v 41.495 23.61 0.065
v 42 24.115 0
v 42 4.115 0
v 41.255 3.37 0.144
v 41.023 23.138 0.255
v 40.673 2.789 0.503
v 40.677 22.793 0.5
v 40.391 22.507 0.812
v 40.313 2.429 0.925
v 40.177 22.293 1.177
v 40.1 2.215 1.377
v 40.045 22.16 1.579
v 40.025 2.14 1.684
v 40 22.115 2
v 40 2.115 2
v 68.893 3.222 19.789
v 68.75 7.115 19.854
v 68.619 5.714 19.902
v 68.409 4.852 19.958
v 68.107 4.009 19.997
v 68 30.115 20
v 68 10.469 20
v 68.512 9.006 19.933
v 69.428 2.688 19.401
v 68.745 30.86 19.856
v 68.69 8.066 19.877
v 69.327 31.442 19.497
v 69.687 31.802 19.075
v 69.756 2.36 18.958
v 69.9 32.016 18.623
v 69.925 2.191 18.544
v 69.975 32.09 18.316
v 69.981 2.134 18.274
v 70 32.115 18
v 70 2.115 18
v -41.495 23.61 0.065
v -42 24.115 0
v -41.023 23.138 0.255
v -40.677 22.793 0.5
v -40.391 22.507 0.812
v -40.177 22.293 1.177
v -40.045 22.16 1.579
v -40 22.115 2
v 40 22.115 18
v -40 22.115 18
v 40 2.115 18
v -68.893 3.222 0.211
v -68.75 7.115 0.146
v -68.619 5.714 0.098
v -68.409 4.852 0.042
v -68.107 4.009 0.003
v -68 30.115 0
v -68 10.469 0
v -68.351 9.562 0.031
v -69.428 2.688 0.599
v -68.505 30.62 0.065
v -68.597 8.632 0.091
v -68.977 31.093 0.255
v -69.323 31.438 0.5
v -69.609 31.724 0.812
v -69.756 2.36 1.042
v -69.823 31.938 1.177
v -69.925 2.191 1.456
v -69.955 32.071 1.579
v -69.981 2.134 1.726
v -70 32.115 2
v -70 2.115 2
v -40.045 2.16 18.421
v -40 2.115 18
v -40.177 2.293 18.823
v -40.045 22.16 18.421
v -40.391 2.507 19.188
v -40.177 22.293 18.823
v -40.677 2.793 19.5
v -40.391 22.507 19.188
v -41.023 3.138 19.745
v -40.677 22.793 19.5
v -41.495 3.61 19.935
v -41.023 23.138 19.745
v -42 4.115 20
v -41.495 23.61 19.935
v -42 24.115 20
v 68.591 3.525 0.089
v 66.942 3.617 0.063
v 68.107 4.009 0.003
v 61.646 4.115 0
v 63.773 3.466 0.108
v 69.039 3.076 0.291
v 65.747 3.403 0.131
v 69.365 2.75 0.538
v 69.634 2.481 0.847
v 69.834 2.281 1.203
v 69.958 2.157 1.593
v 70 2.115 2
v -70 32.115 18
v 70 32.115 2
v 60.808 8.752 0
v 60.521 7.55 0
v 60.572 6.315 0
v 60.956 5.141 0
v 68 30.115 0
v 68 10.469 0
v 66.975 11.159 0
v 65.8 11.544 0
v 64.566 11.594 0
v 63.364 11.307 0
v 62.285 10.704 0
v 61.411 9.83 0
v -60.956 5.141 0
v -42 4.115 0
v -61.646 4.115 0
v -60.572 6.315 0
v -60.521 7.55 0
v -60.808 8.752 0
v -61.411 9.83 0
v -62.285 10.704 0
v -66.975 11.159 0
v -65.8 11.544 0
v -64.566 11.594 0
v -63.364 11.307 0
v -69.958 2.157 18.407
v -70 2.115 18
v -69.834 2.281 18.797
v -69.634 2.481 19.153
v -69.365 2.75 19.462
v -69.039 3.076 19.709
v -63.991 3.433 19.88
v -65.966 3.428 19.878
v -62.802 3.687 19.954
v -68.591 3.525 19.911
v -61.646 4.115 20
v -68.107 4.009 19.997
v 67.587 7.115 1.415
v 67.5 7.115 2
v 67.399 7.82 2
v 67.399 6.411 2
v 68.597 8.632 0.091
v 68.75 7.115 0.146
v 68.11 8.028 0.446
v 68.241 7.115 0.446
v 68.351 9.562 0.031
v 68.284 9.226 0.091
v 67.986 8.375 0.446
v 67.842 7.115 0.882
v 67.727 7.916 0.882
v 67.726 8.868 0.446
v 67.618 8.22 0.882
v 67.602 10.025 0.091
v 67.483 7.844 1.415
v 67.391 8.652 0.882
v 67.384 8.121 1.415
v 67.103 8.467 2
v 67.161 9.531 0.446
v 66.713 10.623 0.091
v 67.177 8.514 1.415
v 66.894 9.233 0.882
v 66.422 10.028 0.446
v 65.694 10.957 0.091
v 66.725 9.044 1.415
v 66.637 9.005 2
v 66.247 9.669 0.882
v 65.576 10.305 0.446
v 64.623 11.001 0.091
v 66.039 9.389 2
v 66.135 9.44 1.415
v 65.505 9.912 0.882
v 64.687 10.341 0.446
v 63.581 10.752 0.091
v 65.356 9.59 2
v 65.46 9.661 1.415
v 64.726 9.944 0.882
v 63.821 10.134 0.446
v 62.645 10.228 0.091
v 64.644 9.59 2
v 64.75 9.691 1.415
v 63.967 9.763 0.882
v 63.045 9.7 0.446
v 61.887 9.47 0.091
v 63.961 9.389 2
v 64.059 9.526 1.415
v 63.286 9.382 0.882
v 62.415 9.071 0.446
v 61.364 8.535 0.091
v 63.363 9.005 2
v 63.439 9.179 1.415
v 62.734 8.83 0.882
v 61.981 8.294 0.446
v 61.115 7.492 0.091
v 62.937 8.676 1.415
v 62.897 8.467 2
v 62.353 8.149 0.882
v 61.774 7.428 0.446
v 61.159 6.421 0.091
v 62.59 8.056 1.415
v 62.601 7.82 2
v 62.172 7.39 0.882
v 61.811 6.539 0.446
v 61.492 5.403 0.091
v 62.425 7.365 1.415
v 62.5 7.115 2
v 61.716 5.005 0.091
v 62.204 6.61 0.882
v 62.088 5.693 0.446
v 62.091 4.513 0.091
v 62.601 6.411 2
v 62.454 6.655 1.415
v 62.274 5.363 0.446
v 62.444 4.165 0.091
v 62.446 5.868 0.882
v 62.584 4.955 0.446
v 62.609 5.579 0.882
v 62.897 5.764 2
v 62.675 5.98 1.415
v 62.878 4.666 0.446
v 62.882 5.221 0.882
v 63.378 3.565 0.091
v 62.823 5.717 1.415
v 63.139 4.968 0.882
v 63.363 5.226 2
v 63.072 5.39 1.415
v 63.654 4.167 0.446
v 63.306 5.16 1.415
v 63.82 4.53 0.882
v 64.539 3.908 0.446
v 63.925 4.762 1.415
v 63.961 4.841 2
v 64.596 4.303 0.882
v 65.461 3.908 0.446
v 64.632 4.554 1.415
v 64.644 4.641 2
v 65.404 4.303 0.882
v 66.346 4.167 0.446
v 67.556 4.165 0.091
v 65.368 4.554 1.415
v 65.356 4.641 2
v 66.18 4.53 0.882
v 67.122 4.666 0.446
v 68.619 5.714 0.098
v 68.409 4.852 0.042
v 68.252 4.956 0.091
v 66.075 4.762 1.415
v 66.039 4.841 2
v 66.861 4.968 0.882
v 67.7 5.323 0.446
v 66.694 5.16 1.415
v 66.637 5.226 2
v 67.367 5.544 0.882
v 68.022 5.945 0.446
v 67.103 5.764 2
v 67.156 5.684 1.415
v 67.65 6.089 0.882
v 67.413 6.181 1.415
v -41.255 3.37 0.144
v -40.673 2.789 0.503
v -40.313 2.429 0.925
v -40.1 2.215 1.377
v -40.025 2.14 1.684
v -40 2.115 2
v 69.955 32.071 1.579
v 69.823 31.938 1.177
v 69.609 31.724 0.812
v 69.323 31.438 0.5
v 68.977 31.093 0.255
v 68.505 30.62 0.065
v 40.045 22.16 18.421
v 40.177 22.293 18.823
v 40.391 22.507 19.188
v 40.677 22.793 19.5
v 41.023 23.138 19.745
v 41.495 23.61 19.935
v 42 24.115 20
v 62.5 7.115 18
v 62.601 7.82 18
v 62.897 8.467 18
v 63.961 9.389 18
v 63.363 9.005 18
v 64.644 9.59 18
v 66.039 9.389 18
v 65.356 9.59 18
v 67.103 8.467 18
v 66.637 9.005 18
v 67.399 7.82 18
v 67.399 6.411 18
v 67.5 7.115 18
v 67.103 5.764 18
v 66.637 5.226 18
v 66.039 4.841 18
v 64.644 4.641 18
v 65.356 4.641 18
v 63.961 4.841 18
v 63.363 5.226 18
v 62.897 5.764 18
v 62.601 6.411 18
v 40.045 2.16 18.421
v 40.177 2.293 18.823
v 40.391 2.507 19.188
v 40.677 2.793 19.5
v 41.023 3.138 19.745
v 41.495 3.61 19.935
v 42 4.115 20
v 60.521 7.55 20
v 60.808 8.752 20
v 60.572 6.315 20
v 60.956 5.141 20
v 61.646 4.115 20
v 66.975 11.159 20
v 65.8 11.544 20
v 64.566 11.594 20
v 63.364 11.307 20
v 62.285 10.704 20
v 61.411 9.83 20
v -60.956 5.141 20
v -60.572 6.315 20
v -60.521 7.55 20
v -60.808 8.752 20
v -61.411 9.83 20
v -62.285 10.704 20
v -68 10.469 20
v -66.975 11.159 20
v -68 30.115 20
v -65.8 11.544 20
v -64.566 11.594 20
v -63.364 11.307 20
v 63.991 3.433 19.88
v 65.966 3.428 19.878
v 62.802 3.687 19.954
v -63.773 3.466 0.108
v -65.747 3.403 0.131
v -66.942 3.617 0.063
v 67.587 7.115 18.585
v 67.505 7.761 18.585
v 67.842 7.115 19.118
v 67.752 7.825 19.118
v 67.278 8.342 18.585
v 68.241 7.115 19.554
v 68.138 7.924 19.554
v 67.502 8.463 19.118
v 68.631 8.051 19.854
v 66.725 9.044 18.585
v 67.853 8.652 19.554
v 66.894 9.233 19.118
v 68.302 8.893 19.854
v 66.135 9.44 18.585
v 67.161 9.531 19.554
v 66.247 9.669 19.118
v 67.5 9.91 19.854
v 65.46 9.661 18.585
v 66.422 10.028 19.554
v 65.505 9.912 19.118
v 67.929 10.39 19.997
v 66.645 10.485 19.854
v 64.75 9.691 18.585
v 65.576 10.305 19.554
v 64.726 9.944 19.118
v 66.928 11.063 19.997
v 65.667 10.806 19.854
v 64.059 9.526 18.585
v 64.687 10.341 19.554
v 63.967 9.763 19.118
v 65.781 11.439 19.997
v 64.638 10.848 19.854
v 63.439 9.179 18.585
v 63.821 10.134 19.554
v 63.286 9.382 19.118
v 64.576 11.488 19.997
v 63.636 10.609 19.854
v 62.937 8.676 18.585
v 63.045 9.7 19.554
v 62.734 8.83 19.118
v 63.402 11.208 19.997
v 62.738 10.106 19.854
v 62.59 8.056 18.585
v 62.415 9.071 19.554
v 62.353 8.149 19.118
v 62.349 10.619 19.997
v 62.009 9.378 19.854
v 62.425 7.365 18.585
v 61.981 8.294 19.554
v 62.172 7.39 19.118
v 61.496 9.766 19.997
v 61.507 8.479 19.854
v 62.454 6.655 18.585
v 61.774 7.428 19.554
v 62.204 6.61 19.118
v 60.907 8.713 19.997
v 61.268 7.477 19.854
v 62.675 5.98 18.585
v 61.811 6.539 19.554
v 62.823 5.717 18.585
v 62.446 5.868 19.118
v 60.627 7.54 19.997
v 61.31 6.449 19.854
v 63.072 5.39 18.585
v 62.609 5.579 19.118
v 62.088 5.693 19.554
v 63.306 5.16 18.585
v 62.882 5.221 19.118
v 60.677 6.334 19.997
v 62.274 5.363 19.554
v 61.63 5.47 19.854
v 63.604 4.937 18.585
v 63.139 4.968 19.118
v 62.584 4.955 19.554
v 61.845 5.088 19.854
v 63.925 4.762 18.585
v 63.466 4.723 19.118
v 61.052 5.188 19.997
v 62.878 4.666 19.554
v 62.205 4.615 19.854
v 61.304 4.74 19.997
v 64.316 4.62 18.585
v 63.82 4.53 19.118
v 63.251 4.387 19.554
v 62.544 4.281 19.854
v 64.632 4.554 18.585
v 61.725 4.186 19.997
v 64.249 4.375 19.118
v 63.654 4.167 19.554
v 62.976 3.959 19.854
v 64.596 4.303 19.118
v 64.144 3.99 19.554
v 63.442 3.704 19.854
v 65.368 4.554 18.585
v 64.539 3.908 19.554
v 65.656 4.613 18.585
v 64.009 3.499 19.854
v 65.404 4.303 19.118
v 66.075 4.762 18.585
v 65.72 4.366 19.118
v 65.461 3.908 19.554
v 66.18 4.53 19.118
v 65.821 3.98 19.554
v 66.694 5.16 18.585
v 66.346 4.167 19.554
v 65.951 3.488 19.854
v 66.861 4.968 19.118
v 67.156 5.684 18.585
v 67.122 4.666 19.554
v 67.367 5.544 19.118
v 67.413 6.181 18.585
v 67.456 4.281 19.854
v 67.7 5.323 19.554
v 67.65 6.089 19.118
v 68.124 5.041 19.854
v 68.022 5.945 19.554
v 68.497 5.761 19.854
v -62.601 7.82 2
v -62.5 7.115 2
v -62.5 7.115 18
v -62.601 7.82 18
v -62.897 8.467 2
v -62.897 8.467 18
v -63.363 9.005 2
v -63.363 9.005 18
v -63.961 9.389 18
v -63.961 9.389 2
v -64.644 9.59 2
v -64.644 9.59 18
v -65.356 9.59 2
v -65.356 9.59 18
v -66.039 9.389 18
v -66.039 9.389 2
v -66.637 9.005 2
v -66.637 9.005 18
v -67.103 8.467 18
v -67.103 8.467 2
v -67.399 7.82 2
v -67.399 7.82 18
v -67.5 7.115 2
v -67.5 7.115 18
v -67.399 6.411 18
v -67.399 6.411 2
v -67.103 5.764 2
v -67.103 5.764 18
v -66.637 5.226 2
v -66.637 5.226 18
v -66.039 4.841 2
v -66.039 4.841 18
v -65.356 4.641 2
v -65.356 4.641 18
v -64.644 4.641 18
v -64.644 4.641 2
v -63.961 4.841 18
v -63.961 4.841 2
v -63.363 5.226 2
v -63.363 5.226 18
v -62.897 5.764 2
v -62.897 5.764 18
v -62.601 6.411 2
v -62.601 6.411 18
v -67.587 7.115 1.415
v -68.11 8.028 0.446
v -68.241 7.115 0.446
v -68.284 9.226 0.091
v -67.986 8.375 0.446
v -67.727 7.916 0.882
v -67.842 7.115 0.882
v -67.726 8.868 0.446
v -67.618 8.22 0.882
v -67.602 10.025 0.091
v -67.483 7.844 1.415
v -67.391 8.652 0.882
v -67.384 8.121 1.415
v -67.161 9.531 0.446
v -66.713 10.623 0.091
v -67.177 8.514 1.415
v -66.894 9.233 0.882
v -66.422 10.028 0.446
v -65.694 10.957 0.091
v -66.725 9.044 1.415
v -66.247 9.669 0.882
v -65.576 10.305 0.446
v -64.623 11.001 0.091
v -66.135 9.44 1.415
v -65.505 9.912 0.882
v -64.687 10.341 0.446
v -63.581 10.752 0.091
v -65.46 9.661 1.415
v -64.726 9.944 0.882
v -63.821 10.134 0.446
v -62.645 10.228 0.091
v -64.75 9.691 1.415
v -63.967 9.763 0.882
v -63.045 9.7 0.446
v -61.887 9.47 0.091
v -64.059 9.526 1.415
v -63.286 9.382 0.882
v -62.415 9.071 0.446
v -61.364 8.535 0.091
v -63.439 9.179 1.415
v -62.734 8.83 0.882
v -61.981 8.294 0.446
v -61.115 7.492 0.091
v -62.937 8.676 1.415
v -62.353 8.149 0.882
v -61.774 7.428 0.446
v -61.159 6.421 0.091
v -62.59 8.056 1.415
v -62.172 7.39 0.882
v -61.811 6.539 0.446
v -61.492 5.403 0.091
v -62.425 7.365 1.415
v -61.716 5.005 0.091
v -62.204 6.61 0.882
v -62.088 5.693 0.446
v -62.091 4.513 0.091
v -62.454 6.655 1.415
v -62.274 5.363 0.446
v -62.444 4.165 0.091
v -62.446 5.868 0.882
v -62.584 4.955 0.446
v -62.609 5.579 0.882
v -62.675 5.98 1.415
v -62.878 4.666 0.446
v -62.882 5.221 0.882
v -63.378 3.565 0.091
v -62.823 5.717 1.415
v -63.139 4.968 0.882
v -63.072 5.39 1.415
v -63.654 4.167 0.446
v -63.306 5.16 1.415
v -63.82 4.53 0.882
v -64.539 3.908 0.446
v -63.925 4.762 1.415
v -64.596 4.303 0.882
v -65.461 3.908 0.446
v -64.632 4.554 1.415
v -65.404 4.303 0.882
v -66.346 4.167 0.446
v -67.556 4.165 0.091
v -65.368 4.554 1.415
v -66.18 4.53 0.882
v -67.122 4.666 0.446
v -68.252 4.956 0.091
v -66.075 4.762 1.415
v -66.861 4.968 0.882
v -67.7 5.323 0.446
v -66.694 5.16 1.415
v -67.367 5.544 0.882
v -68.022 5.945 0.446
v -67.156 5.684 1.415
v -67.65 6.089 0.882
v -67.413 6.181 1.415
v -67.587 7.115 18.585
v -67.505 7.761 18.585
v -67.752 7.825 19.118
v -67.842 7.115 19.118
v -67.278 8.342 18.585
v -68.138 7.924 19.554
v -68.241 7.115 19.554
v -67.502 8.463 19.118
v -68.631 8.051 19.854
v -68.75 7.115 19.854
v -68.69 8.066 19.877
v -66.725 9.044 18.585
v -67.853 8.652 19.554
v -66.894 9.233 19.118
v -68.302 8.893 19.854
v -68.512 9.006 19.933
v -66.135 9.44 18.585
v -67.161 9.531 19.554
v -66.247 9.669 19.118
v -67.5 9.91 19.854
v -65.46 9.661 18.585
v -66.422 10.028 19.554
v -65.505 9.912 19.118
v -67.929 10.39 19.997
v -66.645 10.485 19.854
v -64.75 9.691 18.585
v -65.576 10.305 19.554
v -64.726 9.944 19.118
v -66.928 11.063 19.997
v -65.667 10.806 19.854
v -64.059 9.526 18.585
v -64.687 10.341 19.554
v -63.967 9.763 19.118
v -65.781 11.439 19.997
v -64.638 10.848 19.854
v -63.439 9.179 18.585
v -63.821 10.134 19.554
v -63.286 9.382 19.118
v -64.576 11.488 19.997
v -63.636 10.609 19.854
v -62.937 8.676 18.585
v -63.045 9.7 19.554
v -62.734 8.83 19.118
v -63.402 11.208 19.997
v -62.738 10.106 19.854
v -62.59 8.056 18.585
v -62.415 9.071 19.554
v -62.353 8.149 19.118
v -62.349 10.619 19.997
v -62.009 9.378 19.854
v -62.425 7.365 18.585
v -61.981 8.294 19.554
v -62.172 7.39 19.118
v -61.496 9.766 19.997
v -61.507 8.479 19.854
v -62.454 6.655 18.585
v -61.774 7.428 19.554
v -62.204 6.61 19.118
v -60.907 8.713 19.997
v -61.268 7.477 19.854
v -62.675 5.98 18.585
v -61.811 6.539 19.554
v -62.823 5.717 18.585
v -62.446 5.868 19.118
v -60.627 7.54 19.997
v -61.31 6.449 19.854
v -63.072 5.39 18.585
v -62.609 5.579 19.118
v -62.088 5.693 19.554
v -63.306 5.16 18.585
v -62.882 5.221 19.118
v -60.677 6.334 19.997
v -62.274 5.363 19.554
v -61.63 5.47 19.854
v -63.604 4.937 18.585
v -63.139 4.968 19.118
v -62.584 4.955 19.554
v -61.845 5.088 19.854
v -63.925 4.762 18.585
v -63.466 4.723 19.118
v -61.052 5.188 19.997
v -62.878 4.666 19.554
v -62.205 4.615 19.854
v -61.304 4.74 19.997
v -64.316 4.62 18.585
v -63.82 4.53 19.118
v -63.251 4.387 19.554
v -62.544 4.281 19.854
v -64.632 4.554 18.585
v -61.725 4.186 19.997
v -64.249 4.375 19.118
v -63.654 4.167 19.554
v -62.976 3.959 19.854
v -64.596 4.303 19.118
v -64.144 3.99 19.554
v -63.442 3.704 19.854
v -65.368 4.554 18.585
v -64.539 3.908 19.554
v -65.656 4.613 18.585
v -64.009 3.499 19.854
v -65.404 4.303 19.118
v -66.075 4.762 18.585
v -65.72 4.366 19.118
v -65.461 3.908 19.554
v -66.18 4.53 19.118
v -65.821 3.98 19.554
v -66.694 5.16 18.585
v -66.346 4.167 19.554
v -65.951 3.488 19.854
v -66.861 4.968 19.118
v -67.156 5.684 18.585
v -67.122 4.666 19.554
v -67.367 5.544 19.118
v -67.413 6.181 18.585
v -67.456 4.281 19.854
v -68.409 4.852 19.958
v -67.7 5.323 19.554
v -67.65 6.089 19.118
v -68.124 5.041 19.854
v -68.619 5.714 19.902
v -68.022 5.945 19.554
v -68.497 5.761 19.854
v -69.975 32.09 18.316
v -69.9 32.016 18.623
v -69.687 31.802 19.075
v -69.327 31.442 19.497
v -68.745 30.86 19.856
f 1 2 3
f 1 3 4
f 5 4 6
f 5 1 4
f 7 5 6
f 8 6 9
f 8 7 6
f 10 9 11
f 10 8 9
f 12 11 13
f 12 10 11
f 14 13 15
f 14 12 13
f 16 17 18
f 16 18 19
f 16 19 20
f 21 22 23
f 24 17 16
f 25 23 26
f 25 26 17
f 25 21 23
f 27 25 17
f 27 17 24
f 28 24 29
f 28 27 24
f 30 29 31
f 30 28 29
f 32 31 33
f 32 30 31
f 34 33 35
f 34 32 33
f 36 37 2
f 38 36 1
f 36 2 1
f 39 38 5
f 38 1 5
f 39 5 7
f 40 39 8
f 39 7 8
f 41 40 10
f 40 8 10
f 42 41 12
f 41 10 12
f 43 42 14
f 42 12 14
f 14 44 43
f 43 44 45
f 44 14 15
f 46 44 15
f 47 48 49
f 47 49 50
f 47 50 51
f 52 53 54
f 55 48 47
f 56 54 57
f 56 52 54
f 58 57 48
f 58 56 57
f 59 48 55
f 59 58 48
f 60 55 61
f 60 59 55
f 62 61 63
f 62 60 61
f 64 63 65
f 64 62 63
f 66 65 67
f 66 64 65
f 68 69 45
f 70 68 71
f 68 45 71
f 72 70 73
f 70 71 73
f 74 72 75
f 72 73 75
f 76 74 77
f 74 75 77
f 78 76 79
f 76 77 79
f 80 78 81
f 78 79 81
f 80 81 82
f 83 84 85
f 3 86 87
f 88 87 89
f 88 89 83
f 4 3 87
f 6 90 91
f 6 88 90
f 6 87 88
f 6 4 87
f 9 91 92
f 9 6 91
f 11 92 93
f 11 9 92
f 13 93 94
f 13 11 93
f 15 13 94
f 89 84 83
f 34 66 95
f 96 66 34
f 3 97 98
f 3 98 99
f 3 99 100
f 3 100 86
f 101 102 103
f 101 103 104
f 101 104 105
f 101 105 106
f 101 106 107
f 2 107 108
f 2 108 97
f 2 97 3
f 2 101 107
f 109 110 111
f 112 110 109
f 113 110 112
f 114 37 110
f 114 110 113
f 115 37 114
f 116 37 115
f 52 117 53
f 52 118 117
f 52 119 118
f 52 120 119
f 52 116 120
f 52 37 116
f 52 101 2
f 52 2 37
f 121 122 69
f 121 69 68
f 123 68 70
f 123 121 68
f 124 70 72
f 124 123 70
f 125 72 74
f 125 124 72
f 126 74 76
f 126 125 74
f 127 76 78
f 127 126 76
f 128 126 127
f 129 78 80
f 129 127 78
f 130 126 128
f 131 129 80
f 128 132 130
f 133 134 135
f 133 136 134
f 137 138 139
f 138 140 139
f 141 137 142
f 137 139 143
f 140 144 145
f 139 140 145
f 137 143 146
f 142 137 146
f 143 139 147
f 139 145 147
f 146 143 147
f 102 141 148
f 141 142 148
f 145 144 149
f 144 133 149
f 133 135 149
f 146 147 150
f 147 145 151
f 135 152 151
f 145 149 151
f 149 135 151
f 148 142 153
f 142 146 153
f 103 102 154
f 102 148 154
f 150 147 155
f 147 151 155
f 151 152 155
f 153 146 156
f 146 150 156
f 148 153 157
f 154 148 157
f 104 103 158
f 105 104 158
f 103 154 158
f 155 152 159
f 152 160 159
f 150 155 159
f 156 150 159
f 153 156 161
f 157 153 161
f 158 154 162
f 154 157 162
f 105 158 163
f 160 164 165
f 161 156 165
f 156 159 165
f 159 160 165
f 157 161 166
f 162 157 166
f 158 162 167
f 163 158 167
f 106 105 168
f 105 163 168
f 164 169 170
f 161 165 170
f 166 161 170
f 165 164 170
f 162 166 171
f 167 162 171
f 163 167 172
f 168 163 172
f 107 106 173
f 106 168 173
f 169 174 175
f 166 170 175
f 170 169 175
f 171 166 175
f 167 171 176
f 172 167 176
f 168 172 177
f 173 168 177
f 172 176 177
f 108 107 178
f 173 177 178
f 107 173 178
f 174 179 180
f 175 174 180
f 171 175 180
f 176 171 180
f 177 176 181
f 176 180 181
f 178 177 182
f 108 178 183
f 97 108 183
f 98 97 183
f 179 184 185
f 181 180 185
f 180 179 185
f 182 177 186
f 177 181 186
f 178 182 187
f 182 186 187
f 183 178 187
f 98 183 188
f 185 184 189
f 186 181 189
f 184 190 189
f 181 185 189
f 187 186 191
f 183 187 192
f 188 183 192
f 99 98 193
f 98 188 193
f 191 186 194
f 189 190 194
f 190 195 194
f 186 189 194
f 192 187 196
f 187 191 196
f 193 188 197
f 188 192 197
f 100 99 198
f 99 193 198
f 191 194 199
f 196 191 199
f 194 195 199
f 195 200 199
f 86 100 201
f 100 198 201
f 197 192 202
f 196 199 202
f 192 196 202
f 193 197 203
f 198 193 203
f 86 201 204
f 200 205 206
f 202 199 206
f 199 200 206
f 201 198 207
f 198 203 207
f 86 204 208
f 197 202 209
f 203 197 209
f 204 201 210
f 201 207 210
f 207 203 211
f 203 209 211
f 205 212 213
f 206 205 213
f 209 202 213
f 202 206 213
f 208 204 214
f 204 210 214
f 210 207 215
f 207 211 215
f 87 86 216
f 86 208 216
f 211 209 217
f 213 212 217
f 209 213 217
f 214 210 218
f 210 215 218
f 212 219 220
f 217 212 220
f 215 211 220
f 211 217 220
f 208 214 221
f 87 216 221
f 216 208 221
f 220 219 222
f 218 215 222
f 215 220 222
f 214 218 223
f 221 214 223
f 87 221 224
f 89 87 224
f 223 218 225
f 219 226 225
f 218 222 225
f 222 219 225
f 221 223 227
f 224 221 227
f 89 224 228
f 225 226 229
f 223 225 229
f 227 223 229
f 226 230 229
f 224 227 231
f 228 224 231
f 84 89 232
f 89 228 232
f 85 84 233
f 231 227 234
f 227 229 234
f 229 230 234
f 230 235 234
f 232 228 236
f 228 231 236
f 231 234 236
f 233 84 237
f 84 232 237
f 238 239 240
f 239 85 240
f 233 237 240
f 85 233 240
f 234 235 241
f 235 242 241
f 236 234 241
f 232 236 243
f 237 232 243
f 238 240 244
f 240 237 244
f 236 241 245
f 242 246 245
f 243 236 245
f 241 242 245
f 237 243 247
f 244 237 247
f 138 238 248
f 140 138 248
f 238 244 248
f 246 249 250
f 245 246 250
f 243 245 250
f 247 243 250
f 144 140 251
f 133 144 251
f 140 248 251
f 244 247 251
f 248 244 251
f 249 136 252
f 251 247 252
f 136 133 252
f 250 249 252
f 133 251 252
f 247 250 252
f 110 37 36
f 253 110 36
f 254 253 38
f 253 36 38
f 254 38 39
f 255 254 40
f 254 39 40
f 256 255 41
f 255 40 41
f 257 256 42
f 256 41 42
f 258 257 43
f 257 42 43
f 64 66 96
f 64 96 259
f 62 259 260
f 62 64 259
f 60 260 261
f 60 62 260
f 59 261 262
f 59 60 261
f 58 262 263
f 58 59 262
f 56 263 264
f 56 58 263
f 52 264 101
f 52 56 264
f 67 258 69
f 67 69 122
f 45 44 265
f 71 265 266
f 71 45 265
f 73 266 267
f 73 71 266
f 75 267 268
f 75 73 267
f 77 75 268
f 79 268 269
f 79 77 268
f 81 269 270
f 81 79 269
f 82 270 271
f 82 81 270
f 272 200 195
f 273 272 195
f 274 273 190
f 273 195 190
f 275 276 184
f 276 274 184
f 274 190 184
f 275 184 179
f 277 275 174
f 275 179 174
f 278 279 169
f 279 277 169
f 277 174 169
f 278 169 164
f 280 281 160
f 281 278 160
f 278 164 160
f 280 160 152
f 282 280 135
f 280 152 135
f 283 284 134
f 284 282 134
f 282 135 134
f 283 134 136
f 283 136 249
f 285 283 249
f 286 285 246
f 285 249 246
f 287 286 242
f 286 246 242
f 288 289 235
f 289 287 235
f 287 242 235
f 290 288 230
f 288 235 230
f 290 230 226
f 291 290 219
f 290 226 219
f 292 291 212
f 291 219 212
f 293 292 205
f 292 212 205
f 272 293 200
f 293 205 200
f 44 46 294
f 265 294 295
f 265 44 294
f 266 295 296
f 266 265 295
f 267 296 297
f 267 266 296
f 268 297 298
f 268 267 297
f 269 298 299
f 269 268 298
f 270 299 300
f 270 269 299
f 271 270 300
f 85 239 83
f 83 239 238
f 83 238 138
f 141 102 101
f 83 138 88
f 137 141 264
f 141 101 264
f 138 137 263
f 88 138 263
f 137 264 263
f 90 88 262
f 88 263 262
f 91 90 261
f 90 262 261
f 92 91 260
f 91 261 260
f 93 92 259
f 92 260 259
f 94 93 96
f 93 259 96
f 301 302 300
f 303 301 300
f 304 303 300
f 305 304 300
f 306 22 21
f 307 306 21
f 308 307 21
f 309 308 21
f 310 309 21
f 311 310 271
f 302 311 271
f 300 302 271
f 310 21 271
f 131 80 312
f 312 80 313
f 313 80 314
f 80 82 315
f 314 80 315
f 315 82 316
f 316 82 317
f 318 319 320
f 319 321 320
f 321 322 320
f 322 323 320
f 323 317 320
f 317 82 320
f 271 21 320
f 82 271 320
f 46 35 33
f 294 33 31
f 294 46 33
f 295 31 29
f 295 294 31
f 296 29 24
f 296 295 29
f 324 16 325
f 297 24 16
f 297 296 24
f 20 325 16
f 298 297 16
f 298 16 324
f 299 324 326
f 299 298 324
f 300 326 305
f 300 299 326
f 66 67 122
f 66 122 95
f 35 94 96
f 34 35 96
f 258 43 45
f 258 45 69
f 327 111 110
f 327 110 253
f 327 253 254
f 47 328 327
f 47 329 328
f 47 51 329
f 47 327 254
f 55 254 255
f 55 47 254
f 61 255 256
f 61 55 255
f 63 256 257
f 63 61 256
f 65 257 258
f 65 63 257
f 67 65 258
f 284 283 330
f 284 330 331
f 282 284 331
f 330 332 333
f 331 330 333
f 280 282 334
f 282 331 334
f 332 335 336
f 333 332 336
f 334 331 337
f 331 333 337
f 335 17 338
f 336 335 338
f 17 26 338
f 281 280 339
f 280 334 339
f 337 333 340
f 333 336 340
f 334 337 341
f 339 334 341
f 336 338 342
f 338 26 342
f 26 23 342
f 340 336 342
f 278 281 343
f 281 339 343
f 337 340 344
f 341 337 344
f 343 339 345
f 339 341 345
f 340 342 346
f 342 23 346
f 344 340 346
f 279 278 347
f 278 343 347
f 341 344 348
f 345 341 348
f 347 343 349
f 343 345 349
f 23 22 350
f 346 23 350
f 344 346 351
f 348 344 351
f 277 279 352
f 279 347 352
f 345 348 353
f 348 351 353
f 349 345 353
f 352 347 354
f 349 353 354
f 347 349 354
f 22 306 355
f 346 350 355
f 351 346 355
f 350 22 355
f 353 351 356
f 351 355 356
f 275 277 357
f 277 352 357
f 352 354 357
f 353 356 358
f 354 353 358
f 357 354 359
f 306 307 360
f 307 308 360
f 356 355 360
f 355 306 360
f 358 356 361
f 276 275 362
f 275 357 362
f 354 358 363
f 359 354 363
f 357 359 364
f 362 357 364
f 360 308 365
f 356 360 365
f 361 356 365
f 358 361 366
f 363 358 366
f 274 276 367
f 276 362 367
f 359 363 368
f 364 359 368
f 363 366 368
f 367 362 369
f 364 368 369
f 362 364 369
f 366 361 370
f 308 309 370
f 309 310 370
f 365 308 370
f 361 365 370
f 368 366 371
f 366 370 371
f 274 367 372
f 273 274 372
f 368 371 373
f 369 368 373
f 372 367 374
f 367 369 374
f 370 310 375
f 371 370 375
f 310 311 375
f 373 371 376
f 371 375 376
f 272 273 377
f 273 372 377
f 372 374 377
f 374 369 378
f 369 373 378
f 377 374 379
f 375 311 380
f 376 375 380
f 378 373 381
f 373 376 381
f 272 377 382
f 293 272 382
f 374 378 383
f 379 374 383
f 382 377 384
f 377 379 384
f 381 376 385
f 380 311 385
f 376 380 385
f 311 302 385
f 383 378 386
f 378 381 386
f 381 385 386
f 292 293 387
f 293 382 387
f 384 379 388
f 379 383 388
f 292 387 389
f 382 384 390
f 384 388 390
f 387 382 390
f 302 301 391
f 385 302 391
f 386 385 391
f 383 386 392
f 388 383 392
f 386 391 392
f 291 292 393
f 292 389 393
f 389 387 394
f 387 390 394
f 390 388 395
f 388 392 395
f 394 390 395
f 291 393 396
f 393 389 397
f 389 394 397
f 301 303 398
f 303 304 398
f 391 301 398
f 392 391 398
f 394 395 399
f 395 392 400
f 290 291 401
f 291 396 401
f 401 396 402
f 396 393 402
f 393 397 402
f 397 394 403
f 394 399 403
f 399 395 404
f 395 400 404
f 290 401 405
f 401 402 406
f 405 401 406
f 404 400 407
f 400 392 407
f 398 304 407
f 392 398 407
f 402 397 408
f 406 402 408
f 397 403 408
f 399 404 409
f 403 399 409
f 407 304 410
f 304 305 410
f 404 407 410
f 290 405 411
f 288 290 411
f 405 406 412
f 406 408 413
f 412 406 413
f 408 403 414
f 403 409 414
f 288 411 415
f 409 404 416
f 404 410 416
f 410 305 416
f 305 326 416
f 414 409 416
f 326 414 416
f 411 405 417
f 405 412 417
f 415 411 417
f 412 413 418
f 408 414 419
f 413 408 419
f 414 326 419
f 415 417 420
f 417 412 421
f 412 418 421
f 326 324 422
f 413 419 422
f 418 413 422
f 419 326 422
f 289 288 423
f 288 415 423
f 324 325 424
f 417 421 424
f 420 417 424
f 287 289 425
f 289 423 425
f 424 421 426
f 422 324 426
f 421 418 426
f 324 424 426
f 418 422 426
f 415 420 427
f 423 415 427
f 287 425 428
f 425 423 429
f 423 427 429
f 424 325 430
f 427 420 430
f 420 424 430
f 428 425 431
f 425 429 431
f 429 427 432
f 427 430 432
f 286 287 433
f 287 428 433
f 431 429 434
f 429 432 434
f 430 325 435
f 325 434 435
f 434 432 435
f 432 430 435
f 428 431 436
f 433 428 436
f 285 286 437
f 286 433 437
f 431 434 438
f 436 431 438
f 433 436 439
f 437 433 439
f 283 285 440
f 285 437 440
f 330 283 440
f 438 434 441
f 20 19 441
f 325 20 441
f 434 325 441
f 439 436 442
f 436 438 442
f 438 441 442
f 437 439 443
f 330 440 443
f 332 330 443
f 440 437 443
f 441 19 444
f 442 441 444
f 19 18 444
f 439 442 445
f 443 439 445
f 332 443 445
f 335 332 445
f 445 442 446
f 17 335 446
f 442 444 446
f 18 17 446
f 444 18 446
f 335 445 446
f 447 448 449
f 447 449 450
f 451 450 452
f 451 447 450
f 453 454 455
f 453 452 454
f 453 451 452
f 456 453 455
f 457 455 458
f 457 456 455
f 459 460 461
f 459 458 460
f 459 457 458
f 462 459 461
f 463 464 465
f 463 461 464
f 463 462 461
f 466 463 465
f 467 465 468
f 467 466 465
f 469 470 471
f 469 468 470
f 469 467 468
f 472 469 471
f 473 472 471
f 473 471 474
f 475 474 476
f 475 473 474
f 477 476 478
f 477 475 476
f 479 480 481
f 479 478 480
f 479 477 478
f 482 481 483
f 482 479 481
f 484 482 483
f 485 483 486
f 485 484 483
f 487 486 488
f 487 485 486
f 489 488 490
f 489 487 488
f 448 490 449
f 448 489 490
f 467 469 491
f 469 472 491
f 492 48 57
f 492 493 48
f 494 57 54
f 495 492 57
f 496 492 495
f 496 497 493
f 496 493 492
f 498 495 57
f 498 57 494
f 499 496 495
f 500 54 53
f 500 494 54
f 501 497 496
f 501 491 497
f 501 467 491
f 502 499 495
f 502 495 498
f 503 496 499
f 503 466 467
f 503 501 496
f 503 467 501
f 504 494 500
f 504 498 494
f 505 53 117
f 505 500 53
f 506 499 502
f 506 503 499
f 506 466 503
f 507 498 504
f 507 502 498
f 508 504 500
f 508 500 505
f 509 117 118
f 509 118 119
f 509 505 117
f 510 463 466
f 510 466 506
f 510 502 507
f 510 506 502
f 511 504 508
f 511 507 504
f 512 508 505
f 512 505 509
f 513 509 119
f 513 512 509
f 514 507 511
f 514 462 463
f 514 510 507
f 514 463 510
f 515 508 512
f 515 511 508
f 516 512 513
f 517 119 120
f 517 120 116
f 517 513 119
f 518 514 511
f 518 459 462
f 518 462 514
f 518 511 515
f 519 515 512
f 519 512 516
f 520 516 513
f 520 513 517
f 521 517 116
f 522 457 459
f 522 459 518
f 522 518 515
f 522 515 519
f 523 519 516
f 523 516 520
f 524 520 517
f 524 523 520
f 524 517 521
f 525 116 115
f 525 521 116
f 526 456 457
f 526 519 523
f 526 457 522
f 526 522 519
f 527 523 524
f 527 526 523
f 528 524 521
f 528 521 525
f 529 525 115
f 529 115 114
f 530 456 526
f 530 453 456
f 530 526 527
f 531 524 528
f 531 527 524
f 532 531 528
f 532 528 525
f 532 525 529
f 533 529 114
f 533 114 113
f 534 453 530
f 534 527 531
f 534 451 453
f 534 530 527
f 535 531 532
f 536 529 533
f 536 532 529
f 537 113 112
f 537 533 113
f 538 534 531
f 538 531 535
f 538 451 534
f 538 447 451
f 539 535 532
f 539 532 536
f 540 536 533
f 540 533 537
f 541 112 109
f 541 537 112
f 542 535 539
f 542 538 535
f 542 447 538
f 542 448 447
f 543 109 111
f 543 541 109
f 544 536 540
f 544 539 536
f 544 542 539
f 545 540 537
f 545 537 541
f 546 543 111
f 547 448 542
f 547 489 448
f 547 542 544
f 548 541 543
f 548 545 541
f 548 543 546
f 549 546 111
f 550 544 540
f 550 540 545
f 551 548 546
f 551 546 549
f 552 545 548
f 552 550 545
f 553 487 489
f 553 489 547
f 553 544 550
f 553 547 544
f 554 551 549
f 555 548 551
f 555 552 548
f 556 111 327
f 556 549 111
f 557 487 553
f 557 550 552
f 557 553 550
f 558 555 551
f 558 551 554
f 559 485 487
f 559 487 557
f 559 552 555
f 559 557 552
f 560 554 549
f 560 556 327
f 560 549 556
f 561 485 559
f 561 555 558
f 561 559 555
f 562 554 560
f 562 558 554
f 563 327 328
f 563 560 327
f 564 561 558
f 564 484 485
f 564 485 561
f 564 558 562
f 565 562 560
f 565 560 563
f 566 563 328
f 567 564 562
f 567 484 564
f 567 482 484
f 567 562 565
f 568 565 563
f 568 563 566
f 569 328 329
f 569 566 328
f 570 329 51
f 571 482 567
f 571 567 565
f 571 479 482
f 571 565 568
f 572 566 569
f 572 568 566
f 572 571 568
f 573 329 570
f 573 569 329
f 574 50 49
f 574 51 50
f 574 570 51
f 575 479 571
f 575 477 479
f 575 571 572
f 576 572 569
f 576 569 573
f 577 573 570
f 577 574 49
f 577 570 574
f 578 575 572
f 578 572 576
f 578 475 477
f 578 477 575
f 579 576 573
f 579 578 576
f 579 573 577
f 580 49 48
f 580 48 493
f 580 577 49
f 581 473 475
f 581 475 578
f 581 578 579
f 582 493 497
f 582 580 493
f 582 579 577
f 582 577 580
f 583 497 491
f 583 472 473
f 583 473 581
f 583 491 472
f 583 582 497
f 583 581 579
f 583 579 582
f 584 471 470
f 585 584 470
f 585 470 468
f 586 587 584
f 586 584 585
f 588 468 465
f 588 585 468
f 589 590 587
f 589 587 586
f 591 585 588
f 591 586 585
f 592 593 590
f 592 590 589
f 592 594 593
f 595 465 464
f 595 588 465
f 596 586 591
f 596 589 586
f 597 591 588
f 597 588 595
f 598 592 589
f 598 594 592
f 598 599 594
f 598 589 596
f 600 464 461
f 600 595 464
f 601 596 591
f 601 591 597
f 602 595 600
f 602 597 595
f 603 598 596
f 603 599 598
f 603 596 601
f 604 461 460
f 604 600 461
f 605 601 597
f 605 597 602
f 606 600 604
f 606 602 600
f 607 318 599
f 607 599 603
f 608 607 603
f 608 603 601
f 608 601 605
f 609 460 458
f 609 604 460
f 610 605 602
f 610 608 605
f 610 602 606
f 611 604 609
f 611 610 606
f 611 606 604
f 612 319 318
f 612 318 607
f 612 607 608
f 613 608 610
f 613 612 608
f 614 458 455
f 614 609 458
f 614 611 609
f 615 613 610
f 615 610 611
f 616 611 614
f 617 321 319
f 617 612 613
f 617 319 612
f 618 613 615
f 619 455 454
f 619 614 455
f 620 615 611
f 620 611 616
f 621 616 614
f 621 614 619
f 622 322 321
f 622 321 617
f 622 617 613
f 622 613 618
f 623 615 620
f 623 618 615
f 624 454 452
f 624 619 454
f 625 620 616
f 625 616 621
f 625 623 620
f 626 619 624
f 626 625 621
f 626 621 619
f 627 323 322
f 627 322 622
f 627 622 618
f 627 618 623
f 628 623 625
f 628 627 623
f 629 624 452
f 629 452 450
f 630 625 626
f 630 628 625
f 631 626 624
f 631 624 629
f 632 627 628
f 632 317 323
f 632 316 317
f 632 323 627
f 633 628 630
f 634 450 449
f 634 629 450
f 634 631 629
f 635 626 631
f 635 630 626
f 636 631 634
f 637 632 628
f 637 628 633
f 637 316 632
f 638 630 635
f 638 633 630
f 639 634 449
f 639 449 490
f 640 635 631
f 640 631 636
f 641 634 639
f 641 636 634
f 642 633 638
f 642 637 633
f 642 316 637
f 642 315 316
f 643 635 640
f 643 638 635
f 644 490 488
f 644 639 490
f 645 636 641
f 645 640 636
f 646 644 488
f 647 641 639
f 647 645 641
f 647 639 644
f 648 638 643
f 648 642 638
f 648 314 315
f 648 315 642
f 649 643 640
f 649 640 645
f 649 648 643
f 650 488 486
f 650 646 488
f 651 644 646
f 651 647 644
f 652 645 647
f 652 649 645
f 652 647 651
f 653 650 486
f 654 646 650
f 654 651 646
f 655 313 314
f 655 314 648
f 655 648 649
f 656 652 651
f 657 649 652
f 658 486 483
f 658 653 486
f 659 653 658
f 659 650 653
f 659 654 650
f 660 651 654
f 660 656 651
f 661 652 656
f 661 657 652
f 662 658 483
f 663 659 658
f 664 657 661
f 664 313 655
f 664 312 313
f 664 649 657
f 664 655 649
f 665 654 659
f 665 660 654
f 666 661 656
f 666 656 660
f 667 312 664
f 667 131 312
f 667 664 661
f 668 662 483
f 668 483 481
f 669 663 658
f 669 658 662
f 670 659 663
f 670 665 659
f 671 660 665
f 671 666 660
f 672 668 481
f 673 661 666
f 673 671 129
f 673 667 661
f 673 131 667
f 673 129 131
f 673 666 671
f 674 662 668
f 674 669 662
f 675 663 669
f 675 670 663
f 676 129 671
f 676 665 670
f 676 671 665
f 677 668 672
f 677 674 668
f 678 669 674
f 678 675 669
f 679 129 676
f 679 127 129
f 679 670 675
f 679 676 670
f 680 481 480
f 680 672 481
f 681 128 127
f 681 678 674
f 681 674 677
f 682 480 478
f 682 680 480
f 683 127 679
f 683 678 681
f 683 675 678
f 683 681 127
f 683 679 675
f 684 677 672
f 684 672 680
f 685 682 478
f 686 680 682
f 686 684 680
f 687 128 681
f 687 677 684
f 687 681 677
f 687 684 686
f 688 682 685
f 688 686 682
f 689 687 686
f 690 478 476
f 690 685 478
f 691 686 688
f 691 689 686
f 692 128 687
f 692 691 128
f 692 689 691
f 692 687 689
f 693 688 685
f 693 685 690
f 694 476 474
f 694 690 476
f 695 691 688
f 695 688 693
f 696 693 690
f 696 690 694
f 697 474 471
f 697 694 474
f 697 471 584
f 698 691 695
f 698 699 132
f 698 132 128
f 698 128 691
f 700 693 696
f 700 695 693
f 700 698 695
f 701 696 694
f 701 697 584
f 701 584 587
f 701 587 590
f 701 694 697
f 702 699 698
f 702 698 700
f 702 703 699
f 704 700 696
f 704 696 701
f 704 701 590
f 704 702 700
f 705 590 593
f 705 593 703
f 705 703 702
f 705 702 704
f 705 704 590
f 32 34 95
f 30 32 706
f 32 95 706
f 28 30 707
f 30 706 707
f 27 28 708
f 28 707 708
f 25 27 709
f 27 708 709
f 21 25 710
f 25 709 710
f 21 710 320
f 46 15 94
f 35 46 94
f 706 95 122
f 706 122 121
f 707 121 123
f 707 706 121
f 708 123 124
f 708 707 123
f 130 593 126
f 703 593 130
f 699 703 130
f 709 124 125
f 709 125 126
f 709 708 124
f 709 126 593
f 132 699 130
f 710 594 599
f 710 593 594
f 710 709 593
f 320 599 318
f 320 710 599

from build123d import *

# Parameters (mm, degrees)
F1_DEPTH     = 20
F3_D         = 5
F5_T1_DEPTH  = 150
F5_T3_DEPTH  = 40
F5_T5_DEPTH  = 40
F5_T7_DEPTH  = 25
F5_T9_DEPTH  = 80
F5_T11_DEPTH = 40
F5_T25_DEPTH = 85
F5_T29_DEPTH = 30
F5_T36_DEPTH = 30
F5_T40_DEPTH = 85
F5_T47_DEPTH = 30
F5_T51_DEPTH = 85
F5_T58_DEPTH = 85
F5_T62_DEPTH = 30


# Not quite as in the source:
# - a fillet or chamfer that OpenCascade refuses, or shapes differently, is made with other operations: its cross-section is extruded or revolved along the edge and cut away or added


with BuildPart() as f1:
    # F0 (on Top) → F1 (new body)
    with BuildSketch(Plane.XY):
        Polygon((70, 32.1153850414), (0, 32.1153850414), (0, 22.1153850414), (40, 22.1153850414), (40, 2.1153850414), (70, 2.1153850414), align=None)
    extrude(amount=F1_DEPTH)

    # F3 (through all)
    with Locations(Plane.XY.offset(20)):
        with Locations((65, 7.1153850414)):
            Hole(F3_D / 2)

    # F4: F1 across face


with BuildPart() as f1_1:
    add(f1.part)
    add(f1.part.mirror(Plane(origin=(0, 27.1153850414, 10), x_dir=(0, -1, 0), z_dir=(-1, 0, 0))))

    # F5: fillet of radius 2 on 20 edges, made by hand

    # F5_s2 → F5_t1 (cut)
    with BuildSketch(Plane.YZ.offset(-75)):
        with BuildLine():
            ThreePointArc((32.1153850414, 18), (31.5295986038, 19.4142135624), (30.1153850414, 20))
            Line((30.1153850414, 20), (32.1153850414, 20))
            Line((32.1153850414, 20), (32.1153850414, 18))
        make_face()
        with BuildLine():
            ThreePointArc((32.1153850414, 2), (31.5295986038, 0.5857864376), (30.1153850414, 0))
            Line((30.1153850414, 0), (32.1153850414, 0))
            Line((32.1153850414, 0), (32.1153850414, 2))
        make_face()
    extrude(amount=F5_T1_DEPTH, mode=Mode.SUBTRACT)

    # F5_s4 → F5_t3 (cut)
    with BuildSketch(Plane.XZ.offset(-37.1153850414)):
        with BuildLine():
            ThreePointArc((-70, 18), (-69.4142135624, 19.4142135624), (-68, 20))
            Line((-68, 20), (-70, 20))
            Line((-70, 20), (-70, 18))
        make_face()
        with BuildLine():
            ThreePointArc((68, 20), (69.4142135624, 19.4142135624), (70, 18))
            Line((70, 18), (70, 20))
            Line((70, 20), (68, 20))
        make_face()
        with BuildLine():
            ThreePointArc((-68, 0), (-69.4142135624, 0.5857864376), (-70, 2))
            Line((-70, 2), (-70, 0))
            Line((-70, 0), (-68, 0))
        make_face()
        with BuildLine():
            ThreePointArc((68, 0), (69.4142135624, 0.5857864376), (70, 2))
            Line((70, 2), (70, 0))
            Line((70, 0), (68, 0))
        make_face()
    extrude(amount=F5_T3_DEPTH, mode=Mode.SUBTRACT)

    # F5_s6 → F5_t5 (cut)
    with BuildSketch(Plane.YZ.offset(-75)):
        with BuildLine():
            ThreePointArc((2.1153850414, 18), (2.701171479, 19.4142135624), (4.1153850414, 20))
            Line((4.1153850414, 20), (2.1153850414, 20))
            Line((2.1153850414, 20), (2.1153850414, 18))
        make_face()
        with BuildLine():
            ThreePointArc((4.1153850414, 0), (2.701171479, 0.5857864376), (2.1153850414, 2))
            Line((2.1153850414, 2), (2.1153850414, 0))
            Line((2.1153850414, 0), (4.1153850414, 0))
        make_face()
    extrude(amount=F5_T5_DEPTH, mode=Mode.SUBTRACT)

    # F5_s8 → F5_t7 (cut)
    with BuildSketch(Plane.XZ.offset(-22.1153850414)):
        with BuildLine():
            ThreePointArc((-40, 18), (-40.5857864376, 19.4142135624), (-42, 20))
            Line((-42, 20), (-40, 20))
            Line((-40, 20), (-40, 18))
        make_face()
        with BuildLine():
            ThreePointArc((40, 18), (40.5857864376, 19.4142135624), (42, 20))
            Line((42, 20), (40, 20))
            Line((40, 20), (40, 18))
        make_face()
        with BuildLine():
            ThreePointArc((-42, 0), (-40.5857864376, 0.5857864376), (-40, 2))
            Line((-40, 2), (-40, 0))
            Line((-40, 0), (-42, 0))
        make_face()
        with BuildLine():
            ThreePointArc((42, 0), (40.5857864376, 0.5857864376), (40, 2))
            Line((40, 2), (40, 0))
            Line((40, 0), (42, 0))
        make_face()
    extrude(amount=F5_T7_DEPTH, mode=Mode.SUBTRACT)

    # F5_s10 → F5_t9 (cut)
    with BuildSketch(Plane.YZ.offset(-40)):
        with BuildLine():
            ThreePointArc((22.1153850414, 18), (22.701171479, 19.4142135624), (24.1153850414, 20))
            Line((24.1153850414, 20), (22.1153850414, 20))
            Line((22.1153850414, 20), (22.1153850414, 18))
        make_face()
        with BuildLine():
            ThreePointArc((24.1153850414, 0), (22.701171479, 0.5857864376), (22.1153850414, 2))
            Line((22.1153850414, 2), (22.1153850414, 0))
            Line((22.1153850414, 0), (24.1153850414, 0))
        make_face()
    extrude(amount=F5_T9_DEPTH, mode=Mode.SUBTRACT)

    # F5_s12 → F5_t11 (cut)
    with BuildSketch(Plane.YZ.offset(35)):
        with BuildLine():
            ThreePointArc((2.1153850414, 18), (2.701171479, 19.4142135624), (4.1153850414, 20))
            Line((4.1153850414, 20), (2.1153850414, 20))
            Line((2.1153850414, 20), (2.1153850414, 18))
        make_face()
        with BuildLine():
            ThreePointArc((4.1153850414, 0), (2.701171479, 0.5857864376), (2.1153850414, 2))
            Line((2.1153850414, 2), (2.1153850414, 0))
            Line((2.1153850414, 0), (4.1153850414, 0))
        make_face()
    extrude(amount=F5_T11_DEPTH, mode=Mode.SUBTRACT)

    # F5_s13 → F5_t14 (revolve, cut)
    with BuildSketch(Plane.XZ.offset(-7.1153850414)):
        with BuildLine():
            ThreePointArc((67.5, 18), (68.0857864376, 19.4142135624), (69.5, 20))
            Line((69.5, 20), (67.5, 20))
            Line((67.5, 20), (67.5, 18))
        make_face()
    revolve(axis=Axis((65, 7.1153850414, 20), (0, 0, 1)), mode=Mode.SUBTRACT)

    # F5_s15 → F5_t16 (revolve, cut)
    with BuildSketch(Plane.XZ.offset(-7.1153850414)):
        with BuildLine():
            ThreePointArc((-67.5, 18), (-68.0857864376, 19.4142135624), (-69.5, 20))
            Line((-69.5, 20), (-67.5, 20))
            Line((-67.5, 20), (-67.5, 18))
        make_face()
    revolve(axis=Axis((-65, 7.1153850414, 20), (0, 0, -1)), mode=Mode.SUBTRACT)

    # F5_s17 → F5_t18 (revolve, cut)
    with BuildSketch(Plane.XZ.offset(-7.1153850414)):
        with BuildLine():
            ThreePointArc((69.5, 0), (68.0857864376, 0.5857864376), (67.5, 2))
            Line((67.5, 2), (67.5, 0))
            Line((67.5, 0), (69.5, 0))
        make_face()
    revolve(axis=Axis((65, 7.1153850414, 0), (0, 0, 1)), mode=Mode.SUBTRACT)

    # F5_s19 → F5_t20 (revolve, cut)
    with BuildSketch(Plane.XZ.offset(-7.1153850414)):
        with BuildLine():
            ThreePointArc((-69.5, 0), (-68.0857864376, 0.5857864376), (-67.5, 2))
            Line((-67.5, 2), (-67.5, 0))
            Line((-67.5, 0), (-69.5, 0))
        make_face()
    revolve(axis=Axis((-65, 7.1153850414, 0), (0, 0, -1)), mode=Mode.SUBTRACT)


with BuildPart() as f5_tool23:
    # F5_s24 → F5_t25 (new body)
    with BuildSketch(Plane.YZ.offset(-45)):
        with BuildLine():
            ThreePointArc((22.1153850414, 18), (22.701171479, 19.4142135624), (24.1153850414, 20))
            Line((24.1153850414, 20), (22.1153850414, 20))
            Line((22.1153850414, 20), (22.1153850414, 18))
        make_face()
    extrude(amount=F5_T25_DEPTH)

    split(bisect_by=Plane.YZ.offset(-40), keep=Keep.BOTTOM)


with BuildPart() as f5_tool27:
    # F5_s28 → F5_t29 (new body)
    with BuildSketch(Plane.XZ.offset(-27.1153850414)):
        with BuildLine():
            ThreePointArc((-40, 18), (-40.5857864376, 19.4142135624), (-42, 20))
            Line((-42, 20), (-40, 20))
            Line((-40, 20), (-40, 18))
        make_face()
    extrude(amount=F5_T29_DEPTH)

    split(bisect_by=Plane.XZ.offset(-22.1153850414), keep=Keep.BOTTOM)


with BuildPart() as f5_tool23_1:
    add(f5_tool23.part)

    # F5_t31: intersect F5_tool27
    add(f5_tool27.part, mode=Mode.INTERSECT)


with BuildPart() as f1_2:
    add(f1_1.part)

    # F5_t21: cut F5_tool23
    add(f5_tool23_1.part, mode=Mode.SUBTRACT)


with BuildPart() as f5_tool34:
    # F5_s35 → F5_t36 (new body)
    with BuildSketch(Plane.XZ.offset(-27.1153850414)):
        with BuildLine():
            ThreePointArc((40, 18), (40.5857864376, 19.4142135624), (42, 20))
            Line((42, 20), (40, 20))
            Line((40, 20), (40, 18))
        make_face()
    extrude(amount=F5_T36_DEPTH)

    split(bisect_by=Plane.XZ.offset(-22.1153850414), keep=Keep.BOTTOM)


with BuildPart() as f5_tool38:
    # F5_s39 → F5_t40 (new body)
    with BuildSketch(Plane.YZ.offset(-40)):
        with BuildLine():
            ThreePointArc((22.1153850414, 18), (22.701171479, 19.4142135624), (24.1153850414, 20))
            Line((24.1153850414, 20), (22.1153850414, 20))
            Line((22.1153850414, 20), (22.1153850414, 18))
        make_face()
    extrude(amount=F5_T40_DEPTH)

    split(bisect_by=Plane.YZ.offset(40), keep=Keep.TOP)


with BuildPart() as f5_tool34_1:
    add(f5_tool34.part)

    # F5_t42: intersect F5_tool38
    add(f5_tool38.part, mode=Mode.INTERSECT)


with BuildPart() as f1_3:
    add(f1_2.part)

    # F5_t32: cut F5_tool34
    add(f5_tool34_1.part, mode=Mode.SUBTRACT)


with BuildPart() as f5_tool45:
    # F5_s46 → F5_t47 (new body)
    with BuildSketch(Plane.XZ.offset(-27.1153850414)):
        with BuildLine():
            ThreePointArc((-42, 0), (-40.5857864376, 0.5857864376), (-40, 2))
            Line((-40, 2), (-40, 0))
            Line((-40, 0), (-42, 0))
        make_face()
    extrude(amount=F5_T47_DEPTH)

    split(bisect_by=Plane.XZ.offset(-22.1153850414), keep=Keep.BOTTOM)


with BuildPart() as f5_tool49:
    # F5_s50 → F5_t51 (new body)
    with BuildSketch(Plane.YZ.offset(40)):
        with BuildLine():
            ThreePointArc((24.1153850414, 0), (22.701171479, 0.5857864376), (22.1153850414, 2))
            Line((22.1153850414, 2), (22.1153850414, 0))
            Line((22.1153850414, 0), (24.1153850414, 0))
        make_face()
    extrude(amount=-F5_T51_DEPTH)

    split(bisect_by=Plane.YZ.offset(-40), keep=Keep.BOTTOM)


with BuildPart() as f5_tool45_1:
    add(f5_tool45.part)

    # F5_t53: intersect F5_tool49
    add(f5_tool49.part, mode=Mode.INTERSECT)


with BuildPart() as f1_4:
    add(f1_3.part)

    # F5_t43: cut F5_tool45
    add(f5_tool45_1.part, mode=Mode.SUBTRACT)


with BuildPart() as f5_tool56:
    # F5_s57 → F5_t58 (new body)
    with BuildSketch(Plane.YZ.offset(45)):
        with BuildLine():
            ThreePointArc((24.1153850414, 0), (22.701171479, 0.5857864376), (22.1153850414, 2))
            Line((22.1153850414, 2), (22.1153850414, 0))
            Line((22.1153850414, 0), (24.1153850414, 0))
        make_face()
    extrude(amount=-F5_T58_DEPTH)

    split(bisect_by=Plane.YZ.offset(40), keep=Keep.TOP)


with BuildPart() as f5_tool60:
    # F5_s61 → F5_t62 (new body)
    with BuildSketch(Plane.XZ.offset(-27.1153850414)):
        with BuildLine():
            ThreePointArc((42, 0), (40.5857864376, 0.5857864376), (40, 2))
            Line((40, 2), (40, 0))
            Line((40, 0), (42, 0))
        make_face()
    extrude(amount=F5_T62_DEPTH)

    split(bisect_by=Plane.XZ.offset(-22.1153850414), keep=Keep.BOTTOM)


with BuildPart() as f5_tool56_1:
    add(f5_tool56.part)

    # F5_t64: intersect F5_tool60
    add(f5_tool60.part, mode=Mode.INTERSECT)


with BuildPart() as f1_5:
    add(f1_4.part)

    # F5_t54: cut F5_tool56
    add(f5_tool56_1.part, mode=Mode.SUBTRACT)


solid = f1_5.part
